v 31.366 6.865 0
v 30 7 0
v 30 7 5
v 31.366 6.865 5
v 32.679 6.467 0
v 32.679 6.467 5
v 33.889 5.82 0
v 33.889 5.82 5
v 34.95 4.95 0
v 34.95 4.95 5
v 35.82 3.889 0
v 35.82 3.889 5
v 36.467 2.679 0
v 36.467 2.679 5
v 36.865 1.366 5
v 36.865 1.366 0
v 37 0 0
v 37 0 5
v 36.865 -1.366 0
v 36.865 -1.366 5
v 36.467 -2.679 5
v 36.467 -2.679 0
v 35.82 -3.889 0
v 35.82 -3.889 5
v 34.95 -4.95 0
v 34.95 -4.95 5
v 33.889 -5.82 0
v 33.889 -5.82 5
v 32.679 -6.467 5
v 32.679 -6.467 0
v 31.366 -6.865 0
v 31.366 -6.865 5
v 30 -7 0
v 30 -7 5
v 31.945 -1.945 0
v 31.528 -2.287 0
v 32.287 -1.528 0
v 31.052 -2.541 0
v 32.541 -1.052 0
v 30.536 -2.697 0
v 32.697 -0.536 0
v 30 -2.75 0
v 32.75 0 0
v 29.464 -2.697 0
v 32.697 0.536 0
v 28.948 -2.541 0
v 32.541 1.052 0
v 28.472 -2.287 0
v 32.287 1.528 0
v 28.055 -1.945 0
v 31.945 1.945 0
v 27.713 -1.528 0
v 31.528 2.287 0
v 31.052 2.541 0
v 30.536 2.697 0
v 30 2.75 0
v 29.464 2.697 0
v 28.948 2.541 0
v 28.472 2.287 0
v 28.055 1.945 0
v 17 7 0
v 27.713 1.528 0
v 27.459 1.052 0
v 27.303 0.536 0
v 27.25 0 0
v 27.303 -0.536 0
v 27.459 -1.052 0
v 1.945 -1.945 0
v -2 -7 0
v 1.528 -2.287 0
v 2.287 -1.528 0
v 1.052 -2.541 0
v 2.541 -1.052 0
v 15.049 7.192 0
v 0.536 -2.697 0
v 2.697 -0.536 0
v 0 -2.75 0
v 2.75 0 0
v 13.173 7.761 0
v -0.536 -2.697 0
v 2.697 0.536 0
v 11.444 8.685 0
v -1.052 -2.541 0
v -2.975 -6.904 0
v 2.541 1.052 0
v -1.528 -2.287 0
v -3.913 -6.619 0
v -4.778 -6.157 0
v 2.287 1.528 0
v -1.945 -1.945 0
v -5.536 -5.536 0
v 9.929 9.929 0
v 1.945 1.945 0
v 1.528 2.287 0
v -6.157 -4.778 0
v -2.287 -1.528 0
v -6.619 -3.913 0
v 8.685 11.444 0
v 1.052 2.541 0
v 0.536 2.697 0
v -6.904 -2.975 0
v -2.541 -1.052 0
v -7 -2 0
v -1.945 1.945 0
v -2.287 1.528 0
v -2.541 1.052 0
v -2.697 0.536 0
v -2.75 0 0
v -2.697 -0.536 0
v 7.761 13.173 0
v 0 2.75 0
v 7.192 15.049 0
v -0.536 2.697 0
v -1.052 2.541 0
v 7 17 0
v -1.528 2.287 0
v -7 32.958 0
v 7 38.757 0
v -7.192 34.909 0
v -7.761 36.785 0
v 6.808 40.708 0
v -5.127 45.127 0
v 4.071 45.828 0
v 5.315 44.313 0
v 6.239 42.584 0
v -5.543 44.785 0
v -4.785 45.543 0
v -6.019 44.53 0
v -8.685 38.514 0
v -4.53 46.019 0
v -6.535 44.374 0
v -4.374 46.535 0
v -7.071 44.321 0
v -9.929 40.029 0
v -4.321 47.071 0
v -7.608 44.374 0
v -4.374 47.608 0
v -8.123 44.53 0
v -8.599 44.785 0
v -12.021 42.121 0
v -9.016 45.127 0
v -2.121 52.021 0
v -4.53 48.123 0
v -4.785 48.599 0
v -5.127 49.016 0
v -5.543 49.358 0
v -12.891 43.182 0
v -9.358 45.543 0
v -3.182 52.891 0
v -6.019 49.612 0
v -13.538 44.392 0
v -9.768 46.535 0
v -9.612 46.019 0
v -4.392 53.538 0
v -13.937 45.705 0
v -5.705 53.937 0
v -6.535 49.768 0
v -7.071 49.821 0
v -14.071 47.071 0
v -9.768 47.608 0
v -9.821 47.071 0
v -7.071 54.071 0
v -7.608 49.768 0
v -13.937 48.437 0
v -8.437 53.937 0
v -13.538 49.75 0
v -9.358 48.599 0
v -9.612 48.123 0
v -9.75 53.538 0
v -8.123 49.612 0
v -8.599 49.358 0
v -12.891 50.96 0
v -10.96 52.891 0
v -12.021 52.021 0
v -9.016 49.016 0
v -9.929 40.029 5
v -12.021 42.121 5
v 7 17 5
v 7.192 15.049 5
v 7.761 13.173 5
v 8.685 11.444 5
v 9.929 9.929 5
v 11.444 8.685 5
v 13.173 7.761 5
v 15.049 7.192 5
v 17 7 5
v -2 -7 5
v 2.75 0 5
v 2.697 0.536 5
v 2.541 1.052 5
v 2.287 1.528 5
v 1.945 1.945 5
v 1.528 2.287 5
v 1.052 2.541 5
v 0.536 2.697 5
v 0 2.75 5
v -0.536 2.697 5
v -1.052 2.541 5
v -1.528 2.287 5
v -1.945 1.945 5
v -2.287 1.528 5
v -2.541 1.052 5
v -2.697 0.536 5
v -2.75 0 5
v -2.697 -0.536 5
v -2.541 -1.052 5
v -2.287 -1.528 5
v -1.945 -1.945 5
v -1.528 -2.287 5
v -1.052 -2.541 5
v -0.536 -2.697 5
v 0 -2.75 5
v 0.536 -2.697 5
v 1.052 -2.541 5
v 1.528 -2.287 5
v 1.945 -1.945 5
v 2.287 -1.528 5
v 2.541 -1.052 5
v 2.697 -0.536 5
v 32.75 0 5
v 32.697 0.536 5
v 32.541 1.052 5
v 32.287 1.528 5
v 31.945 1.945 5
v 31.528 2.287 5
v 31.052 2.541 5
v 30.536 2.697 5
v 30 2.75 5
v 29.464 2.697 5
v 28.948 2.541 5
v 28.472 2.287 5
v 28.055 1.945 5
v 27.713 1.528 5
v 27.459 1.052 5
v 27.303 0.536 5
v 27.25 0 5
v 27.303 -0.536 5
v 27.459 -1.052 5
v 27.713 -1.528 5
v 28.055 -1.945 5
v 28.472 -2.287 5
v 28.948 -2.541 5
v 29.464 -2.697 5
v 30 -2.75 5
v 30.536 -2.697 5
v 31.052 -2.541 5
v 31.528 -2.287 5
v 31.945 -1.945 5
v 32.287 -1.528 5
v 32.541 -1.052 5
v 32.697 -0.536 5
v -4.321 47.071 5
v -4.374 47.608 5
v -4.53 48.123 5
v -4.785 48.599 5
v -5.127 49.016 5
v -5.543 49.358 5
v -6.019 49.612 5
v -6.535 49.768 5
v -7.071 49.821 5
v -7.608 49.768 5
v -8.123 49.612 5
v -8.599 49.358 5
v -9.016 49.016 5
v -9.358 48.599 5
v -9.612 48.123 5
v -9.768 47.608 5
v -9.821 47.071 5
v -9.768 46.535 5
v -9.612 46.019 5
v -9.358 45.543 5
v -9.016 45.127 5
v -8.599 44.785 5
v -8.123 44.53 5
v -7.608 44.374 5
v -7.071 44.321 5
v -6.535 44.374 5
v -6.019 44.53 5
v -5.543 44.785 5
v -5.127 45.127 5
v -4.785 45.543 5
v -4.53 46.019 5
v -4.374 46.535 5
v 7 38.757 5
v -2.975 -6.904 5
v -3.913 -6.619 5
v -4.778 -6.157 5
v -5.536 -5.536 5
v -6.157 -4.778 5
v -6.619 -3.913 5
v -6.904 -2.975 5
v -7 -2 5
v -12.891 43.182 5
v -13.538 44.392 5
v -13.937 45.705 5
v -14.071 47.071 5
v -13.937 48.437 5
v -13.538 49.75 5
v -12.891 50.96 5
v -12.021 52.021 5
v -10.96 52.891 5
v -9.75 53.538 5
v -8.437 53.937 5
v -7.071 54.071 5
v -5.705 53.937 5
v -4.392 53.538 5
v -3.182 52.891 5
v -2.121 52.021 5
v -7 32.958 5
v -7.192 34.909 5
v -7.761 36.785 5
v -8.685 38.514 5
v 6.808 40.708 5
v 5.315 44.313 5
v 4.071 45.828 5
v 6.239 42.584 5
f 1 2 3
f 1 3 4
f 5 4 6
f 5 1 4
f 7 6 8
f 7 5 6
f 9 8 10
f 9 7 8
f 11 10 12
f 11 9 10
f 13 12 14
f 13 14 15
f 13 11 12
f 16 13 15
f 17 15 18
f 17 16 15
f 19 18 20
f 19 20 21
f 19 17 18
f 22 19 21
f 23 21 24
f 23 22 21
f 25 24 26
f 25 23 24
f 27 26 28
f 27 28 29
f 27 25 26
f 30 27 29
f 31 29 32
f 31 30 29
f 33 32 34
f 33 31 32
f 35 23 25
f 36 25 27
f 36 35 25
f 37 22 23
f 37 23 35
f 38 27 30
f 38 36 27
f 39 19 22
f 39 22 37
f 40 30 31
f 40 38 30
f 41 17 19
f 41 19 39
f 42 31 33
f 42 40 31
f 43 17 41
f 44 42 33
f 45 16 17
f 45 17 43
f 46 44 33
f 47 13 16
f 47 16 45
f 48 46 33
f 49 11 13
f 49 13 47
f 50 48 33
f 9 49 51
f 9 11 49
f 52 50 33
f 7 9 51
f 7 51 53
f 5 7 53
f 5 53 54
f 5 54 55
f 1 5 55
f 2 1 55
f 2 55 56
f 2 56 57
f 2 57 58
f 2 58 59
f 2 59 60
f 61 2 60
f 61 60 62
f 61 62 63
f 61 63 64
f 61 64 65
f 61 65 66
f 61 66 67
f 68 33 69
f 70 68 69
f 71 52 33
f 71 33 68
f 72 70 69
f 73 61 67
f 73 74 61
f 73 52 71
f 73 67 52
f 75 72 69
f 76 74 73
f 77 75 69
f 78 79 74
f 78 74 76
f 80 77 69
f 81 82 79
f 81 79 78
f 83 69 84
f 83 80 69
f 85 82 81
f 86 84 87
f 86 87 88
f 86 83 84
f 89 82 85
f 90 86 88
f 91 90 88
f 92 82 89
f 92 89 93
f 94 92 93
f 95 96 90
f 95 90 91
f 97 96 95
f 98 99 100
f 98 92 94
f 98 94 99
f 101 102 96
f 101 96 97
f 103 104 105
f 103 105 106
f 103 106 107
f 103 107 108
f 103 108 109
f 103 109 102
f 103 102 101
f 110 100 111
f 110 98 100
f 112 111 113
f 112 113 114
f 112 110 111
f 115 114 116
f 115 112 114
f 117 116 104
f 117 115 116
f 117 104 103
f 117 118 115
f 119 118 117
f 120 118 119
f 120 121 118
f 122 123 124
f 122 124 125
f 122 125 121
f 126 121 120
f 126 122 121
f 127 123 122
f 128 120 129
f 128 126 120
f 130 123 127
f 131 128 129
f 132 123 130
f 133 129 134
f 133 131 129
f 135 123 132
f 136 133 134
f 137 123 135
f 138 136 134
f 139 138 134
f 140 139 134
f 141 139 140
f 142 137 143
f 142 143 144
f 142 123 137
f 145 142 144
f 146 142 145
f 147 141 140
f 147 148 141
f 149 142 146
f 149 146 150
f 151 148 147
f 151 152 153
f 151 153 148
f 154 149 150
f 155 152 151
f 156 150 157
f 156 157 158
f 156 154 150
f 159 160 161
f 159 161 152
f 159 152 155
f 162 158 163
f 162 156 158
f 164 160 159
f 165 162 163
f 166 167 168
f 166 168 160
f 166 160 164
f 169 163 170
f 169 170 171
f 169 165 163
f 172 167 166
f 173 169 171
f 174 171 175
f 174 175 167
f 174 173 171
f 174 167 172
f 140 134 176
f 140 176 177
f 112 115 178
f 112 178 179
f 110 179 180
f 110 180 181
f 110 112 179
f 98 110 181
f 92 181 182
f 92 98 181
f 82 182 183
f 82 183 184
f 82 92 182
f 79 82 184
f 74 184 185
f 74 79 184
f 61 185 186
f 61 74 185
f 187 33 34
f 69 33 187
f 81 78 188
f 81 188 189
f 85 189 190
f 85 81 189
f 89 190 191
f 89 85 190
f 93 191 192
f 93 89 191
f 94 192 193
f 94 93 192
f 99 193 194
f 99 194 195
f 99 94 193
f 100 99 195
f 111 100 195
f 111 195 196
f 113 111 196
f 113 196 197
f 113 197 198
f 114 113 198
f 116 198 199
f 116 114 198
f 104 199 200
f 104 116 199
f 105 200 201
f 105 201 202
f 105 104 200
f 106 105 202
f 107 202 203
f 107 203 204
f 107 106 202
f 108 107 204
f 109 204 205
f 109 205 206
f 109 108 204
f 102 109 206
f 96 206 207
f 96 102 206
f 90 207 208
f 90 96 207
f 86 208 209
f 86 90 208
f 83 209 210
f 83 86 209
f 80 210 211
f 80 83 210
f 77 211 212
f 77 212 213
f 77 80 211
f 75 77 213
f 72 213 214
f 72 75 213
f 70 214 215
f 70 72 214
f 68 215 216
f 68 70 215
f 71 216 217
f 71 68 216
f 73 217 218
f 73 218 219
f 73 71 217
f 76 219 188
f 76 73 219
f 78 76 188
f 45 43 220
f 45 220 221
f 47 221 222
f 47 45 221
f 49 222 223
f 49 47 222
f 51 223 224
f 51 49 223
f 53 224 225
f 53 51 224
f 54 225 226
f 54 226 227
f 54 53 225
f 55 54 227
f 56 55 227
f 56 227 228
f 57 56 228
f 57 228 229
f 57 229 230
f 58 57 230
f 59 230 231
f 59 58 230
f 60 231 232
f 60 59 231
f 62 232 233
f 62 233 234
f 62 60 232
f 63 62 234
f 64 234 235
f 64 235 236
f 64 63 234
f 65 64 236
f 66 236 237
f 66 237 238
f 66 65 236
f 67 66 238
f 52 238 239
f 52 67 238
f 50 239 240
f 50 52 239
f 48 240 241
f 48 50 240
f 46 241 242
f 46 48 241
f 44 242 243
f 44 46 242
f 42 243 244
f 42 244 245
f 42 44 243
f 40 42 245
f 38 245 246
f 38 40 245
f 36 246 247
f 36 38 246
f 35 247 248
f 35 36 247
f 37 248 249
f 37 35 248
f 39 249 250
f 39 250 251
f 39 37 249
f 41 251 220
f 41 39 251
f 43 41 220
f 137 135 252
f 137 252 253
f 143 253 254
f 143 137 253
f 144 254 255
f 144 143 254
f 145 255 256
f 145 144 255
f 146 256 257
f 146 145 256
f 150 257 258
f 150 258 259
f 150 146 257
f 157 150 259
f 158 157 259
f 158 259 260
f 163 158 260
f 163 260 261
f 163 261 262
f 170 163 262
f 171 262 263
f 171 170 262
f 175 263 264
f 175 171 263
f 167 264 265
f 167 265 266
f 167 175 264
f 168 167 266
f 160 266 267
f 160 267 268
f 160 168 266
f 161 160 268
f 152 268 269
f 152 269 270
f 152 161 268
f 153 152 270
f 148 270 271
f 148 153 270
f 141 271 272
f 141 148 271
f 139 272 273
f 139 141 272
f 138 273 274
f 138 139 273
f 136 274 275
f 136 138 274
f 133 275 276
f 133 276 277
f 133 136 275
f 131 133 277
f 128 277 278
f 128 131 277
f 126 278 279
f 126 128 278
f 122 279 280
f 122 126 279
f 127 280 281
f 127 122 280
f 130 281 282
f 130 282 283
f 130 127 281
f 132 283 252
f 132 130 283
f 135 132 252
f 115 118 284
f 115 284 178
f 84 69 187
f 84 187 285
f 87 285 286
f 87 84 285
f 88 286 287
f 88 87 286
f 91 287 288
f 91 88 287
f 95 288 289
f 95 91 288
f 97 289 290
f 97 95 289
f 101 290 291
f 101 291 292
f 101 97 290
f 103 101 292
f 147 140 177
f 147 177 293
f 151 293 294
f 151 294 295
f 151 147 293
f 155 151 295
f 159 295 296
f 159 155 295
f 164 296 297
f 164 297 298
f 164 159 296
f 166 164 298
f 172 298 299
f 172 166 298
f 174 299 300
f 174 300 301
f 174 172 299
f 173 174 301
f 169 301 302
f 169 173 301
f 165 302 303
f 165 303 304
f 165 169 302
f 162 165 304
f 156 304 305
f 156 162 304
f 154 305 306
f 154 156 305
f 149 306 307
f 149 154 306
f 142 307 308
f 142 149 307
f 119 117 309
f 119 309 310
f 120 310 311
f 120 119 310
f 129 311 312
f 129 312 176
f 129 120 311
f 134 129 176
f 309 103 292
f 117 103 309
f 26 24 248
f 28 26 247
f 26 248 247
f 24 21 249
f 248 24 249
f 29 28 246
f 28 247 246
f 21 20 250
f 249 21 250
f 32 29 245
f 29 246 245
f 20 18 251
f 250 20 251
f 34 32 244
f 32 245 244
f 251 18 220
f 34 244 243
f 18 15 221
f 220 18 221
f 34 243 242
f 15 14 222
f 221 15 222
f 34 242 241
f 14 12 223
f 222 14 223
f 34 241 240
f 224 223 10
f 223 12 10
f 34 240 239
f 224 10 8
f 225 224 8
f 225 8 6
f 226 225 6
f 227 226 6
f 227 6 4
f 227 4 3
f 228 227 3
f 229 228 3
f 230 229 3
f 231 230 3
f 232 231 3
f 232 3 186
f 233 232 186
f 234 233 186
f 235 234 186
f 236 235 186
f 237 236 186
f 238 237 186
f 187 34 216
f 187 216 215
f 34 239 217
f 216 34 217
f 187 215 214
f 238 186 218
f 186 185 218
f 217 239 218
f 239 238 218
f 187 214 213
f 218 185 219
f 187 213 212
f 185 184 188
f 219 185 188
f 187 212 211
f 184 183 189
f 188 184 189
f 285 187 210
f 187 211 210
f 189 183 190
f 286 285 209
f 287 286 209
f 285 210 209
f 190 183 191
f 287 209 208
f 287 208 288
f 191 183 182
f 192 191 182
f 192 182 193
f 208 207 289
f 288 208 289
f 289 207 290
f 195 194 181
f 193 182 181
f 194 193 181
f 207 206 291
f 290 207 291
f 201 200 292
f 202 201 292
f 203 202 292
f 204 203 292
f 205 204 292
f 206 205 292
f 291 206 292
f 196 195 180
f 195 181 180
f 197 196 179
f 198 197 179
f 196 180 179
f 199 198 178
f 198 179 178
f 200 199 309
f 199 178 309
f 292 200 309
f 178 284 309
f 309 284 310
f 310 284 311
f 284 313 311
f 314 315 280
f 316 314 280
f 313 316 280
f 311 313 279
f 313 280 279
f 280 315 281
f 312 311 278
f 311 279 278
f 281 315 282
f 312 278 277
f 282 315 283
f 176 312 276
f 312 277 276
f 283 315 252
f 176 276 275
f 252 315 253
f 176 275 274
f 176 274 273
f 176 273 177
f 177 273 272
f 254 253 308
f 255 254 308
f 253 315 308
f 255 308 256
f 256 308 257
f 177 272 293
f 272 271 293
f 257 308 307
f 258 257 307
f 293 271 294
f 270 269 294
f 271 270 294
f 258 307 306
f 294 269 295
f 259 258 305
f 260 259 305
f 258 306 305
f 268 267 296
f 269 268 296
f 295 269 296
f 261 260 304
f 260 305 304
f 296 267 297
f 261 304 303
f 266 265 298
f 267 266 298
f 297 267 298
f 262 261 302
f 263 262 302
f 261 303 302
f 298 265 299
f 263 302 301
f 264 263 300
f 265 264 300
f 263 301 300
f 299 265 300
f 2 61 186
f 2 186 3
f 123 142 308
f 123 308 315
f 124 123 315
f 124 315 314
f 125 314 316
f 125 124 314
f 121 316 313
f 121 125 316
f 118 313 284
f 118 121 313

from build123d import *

# Parameters (mm, degrees)
SKETCH_1_R      = 2.75
EXTRUDE_1_DEPTH = 5


with BuildPart() as part:
    # 草圖1 → 填料-伸長1 (new body)
    with BuildSketch(Plane.XY):
        with BuildLine():
            Line((17, 7), (30, 7))
            ThreePointArc((30, 7), (37, 0), (30, -7))
            Line((30, -7), (-2, -7))
            ThreePointArc((-2, -7), (-5.535533906, -5.535533906), (-7, -2))
            Line((-7, -2), (-7, 32.95836944))
            ThreePointArc((-7, 32.95836944), (-7.761204675, 36.785203763), (-9.928932188, 40.029437252))
            Line((-9.928932188, 40.029437252), (-12.02081528, 42.121320344))
            ThreePointArc((-12.02081528, 42.121320344), (-12.02081528, 52.02081528), (-2.121320344, 52.02081528))
            Line((-2.121320344, 52.02081528), (4.071067812, 45.828427125))
            ThreePointArc((4.071067812, 45.828427125), (6.238795325, 42.584193637), (7, 38.757359313))
            Line((7, 38.757359313), (7, 17))
            ThreePointArc((7, 17), (9.928932188, 9.928932188), (17, 7))
        make_face()
        Circle(SKETCH_1_R, mode=Mode.SUBTRACT)
        with Locations((30, 0)):
            Circle(SKETCH_1_R, mode=Mode.SUBTRACT)
        with Locations((-7.071067812, 47.071067812)):
            Circle(SKETCH_1_R, mode=Mode.SUBTRACT)
    extrude(amount=EXTRUDE_1_DEPTH)


solid = part.part
